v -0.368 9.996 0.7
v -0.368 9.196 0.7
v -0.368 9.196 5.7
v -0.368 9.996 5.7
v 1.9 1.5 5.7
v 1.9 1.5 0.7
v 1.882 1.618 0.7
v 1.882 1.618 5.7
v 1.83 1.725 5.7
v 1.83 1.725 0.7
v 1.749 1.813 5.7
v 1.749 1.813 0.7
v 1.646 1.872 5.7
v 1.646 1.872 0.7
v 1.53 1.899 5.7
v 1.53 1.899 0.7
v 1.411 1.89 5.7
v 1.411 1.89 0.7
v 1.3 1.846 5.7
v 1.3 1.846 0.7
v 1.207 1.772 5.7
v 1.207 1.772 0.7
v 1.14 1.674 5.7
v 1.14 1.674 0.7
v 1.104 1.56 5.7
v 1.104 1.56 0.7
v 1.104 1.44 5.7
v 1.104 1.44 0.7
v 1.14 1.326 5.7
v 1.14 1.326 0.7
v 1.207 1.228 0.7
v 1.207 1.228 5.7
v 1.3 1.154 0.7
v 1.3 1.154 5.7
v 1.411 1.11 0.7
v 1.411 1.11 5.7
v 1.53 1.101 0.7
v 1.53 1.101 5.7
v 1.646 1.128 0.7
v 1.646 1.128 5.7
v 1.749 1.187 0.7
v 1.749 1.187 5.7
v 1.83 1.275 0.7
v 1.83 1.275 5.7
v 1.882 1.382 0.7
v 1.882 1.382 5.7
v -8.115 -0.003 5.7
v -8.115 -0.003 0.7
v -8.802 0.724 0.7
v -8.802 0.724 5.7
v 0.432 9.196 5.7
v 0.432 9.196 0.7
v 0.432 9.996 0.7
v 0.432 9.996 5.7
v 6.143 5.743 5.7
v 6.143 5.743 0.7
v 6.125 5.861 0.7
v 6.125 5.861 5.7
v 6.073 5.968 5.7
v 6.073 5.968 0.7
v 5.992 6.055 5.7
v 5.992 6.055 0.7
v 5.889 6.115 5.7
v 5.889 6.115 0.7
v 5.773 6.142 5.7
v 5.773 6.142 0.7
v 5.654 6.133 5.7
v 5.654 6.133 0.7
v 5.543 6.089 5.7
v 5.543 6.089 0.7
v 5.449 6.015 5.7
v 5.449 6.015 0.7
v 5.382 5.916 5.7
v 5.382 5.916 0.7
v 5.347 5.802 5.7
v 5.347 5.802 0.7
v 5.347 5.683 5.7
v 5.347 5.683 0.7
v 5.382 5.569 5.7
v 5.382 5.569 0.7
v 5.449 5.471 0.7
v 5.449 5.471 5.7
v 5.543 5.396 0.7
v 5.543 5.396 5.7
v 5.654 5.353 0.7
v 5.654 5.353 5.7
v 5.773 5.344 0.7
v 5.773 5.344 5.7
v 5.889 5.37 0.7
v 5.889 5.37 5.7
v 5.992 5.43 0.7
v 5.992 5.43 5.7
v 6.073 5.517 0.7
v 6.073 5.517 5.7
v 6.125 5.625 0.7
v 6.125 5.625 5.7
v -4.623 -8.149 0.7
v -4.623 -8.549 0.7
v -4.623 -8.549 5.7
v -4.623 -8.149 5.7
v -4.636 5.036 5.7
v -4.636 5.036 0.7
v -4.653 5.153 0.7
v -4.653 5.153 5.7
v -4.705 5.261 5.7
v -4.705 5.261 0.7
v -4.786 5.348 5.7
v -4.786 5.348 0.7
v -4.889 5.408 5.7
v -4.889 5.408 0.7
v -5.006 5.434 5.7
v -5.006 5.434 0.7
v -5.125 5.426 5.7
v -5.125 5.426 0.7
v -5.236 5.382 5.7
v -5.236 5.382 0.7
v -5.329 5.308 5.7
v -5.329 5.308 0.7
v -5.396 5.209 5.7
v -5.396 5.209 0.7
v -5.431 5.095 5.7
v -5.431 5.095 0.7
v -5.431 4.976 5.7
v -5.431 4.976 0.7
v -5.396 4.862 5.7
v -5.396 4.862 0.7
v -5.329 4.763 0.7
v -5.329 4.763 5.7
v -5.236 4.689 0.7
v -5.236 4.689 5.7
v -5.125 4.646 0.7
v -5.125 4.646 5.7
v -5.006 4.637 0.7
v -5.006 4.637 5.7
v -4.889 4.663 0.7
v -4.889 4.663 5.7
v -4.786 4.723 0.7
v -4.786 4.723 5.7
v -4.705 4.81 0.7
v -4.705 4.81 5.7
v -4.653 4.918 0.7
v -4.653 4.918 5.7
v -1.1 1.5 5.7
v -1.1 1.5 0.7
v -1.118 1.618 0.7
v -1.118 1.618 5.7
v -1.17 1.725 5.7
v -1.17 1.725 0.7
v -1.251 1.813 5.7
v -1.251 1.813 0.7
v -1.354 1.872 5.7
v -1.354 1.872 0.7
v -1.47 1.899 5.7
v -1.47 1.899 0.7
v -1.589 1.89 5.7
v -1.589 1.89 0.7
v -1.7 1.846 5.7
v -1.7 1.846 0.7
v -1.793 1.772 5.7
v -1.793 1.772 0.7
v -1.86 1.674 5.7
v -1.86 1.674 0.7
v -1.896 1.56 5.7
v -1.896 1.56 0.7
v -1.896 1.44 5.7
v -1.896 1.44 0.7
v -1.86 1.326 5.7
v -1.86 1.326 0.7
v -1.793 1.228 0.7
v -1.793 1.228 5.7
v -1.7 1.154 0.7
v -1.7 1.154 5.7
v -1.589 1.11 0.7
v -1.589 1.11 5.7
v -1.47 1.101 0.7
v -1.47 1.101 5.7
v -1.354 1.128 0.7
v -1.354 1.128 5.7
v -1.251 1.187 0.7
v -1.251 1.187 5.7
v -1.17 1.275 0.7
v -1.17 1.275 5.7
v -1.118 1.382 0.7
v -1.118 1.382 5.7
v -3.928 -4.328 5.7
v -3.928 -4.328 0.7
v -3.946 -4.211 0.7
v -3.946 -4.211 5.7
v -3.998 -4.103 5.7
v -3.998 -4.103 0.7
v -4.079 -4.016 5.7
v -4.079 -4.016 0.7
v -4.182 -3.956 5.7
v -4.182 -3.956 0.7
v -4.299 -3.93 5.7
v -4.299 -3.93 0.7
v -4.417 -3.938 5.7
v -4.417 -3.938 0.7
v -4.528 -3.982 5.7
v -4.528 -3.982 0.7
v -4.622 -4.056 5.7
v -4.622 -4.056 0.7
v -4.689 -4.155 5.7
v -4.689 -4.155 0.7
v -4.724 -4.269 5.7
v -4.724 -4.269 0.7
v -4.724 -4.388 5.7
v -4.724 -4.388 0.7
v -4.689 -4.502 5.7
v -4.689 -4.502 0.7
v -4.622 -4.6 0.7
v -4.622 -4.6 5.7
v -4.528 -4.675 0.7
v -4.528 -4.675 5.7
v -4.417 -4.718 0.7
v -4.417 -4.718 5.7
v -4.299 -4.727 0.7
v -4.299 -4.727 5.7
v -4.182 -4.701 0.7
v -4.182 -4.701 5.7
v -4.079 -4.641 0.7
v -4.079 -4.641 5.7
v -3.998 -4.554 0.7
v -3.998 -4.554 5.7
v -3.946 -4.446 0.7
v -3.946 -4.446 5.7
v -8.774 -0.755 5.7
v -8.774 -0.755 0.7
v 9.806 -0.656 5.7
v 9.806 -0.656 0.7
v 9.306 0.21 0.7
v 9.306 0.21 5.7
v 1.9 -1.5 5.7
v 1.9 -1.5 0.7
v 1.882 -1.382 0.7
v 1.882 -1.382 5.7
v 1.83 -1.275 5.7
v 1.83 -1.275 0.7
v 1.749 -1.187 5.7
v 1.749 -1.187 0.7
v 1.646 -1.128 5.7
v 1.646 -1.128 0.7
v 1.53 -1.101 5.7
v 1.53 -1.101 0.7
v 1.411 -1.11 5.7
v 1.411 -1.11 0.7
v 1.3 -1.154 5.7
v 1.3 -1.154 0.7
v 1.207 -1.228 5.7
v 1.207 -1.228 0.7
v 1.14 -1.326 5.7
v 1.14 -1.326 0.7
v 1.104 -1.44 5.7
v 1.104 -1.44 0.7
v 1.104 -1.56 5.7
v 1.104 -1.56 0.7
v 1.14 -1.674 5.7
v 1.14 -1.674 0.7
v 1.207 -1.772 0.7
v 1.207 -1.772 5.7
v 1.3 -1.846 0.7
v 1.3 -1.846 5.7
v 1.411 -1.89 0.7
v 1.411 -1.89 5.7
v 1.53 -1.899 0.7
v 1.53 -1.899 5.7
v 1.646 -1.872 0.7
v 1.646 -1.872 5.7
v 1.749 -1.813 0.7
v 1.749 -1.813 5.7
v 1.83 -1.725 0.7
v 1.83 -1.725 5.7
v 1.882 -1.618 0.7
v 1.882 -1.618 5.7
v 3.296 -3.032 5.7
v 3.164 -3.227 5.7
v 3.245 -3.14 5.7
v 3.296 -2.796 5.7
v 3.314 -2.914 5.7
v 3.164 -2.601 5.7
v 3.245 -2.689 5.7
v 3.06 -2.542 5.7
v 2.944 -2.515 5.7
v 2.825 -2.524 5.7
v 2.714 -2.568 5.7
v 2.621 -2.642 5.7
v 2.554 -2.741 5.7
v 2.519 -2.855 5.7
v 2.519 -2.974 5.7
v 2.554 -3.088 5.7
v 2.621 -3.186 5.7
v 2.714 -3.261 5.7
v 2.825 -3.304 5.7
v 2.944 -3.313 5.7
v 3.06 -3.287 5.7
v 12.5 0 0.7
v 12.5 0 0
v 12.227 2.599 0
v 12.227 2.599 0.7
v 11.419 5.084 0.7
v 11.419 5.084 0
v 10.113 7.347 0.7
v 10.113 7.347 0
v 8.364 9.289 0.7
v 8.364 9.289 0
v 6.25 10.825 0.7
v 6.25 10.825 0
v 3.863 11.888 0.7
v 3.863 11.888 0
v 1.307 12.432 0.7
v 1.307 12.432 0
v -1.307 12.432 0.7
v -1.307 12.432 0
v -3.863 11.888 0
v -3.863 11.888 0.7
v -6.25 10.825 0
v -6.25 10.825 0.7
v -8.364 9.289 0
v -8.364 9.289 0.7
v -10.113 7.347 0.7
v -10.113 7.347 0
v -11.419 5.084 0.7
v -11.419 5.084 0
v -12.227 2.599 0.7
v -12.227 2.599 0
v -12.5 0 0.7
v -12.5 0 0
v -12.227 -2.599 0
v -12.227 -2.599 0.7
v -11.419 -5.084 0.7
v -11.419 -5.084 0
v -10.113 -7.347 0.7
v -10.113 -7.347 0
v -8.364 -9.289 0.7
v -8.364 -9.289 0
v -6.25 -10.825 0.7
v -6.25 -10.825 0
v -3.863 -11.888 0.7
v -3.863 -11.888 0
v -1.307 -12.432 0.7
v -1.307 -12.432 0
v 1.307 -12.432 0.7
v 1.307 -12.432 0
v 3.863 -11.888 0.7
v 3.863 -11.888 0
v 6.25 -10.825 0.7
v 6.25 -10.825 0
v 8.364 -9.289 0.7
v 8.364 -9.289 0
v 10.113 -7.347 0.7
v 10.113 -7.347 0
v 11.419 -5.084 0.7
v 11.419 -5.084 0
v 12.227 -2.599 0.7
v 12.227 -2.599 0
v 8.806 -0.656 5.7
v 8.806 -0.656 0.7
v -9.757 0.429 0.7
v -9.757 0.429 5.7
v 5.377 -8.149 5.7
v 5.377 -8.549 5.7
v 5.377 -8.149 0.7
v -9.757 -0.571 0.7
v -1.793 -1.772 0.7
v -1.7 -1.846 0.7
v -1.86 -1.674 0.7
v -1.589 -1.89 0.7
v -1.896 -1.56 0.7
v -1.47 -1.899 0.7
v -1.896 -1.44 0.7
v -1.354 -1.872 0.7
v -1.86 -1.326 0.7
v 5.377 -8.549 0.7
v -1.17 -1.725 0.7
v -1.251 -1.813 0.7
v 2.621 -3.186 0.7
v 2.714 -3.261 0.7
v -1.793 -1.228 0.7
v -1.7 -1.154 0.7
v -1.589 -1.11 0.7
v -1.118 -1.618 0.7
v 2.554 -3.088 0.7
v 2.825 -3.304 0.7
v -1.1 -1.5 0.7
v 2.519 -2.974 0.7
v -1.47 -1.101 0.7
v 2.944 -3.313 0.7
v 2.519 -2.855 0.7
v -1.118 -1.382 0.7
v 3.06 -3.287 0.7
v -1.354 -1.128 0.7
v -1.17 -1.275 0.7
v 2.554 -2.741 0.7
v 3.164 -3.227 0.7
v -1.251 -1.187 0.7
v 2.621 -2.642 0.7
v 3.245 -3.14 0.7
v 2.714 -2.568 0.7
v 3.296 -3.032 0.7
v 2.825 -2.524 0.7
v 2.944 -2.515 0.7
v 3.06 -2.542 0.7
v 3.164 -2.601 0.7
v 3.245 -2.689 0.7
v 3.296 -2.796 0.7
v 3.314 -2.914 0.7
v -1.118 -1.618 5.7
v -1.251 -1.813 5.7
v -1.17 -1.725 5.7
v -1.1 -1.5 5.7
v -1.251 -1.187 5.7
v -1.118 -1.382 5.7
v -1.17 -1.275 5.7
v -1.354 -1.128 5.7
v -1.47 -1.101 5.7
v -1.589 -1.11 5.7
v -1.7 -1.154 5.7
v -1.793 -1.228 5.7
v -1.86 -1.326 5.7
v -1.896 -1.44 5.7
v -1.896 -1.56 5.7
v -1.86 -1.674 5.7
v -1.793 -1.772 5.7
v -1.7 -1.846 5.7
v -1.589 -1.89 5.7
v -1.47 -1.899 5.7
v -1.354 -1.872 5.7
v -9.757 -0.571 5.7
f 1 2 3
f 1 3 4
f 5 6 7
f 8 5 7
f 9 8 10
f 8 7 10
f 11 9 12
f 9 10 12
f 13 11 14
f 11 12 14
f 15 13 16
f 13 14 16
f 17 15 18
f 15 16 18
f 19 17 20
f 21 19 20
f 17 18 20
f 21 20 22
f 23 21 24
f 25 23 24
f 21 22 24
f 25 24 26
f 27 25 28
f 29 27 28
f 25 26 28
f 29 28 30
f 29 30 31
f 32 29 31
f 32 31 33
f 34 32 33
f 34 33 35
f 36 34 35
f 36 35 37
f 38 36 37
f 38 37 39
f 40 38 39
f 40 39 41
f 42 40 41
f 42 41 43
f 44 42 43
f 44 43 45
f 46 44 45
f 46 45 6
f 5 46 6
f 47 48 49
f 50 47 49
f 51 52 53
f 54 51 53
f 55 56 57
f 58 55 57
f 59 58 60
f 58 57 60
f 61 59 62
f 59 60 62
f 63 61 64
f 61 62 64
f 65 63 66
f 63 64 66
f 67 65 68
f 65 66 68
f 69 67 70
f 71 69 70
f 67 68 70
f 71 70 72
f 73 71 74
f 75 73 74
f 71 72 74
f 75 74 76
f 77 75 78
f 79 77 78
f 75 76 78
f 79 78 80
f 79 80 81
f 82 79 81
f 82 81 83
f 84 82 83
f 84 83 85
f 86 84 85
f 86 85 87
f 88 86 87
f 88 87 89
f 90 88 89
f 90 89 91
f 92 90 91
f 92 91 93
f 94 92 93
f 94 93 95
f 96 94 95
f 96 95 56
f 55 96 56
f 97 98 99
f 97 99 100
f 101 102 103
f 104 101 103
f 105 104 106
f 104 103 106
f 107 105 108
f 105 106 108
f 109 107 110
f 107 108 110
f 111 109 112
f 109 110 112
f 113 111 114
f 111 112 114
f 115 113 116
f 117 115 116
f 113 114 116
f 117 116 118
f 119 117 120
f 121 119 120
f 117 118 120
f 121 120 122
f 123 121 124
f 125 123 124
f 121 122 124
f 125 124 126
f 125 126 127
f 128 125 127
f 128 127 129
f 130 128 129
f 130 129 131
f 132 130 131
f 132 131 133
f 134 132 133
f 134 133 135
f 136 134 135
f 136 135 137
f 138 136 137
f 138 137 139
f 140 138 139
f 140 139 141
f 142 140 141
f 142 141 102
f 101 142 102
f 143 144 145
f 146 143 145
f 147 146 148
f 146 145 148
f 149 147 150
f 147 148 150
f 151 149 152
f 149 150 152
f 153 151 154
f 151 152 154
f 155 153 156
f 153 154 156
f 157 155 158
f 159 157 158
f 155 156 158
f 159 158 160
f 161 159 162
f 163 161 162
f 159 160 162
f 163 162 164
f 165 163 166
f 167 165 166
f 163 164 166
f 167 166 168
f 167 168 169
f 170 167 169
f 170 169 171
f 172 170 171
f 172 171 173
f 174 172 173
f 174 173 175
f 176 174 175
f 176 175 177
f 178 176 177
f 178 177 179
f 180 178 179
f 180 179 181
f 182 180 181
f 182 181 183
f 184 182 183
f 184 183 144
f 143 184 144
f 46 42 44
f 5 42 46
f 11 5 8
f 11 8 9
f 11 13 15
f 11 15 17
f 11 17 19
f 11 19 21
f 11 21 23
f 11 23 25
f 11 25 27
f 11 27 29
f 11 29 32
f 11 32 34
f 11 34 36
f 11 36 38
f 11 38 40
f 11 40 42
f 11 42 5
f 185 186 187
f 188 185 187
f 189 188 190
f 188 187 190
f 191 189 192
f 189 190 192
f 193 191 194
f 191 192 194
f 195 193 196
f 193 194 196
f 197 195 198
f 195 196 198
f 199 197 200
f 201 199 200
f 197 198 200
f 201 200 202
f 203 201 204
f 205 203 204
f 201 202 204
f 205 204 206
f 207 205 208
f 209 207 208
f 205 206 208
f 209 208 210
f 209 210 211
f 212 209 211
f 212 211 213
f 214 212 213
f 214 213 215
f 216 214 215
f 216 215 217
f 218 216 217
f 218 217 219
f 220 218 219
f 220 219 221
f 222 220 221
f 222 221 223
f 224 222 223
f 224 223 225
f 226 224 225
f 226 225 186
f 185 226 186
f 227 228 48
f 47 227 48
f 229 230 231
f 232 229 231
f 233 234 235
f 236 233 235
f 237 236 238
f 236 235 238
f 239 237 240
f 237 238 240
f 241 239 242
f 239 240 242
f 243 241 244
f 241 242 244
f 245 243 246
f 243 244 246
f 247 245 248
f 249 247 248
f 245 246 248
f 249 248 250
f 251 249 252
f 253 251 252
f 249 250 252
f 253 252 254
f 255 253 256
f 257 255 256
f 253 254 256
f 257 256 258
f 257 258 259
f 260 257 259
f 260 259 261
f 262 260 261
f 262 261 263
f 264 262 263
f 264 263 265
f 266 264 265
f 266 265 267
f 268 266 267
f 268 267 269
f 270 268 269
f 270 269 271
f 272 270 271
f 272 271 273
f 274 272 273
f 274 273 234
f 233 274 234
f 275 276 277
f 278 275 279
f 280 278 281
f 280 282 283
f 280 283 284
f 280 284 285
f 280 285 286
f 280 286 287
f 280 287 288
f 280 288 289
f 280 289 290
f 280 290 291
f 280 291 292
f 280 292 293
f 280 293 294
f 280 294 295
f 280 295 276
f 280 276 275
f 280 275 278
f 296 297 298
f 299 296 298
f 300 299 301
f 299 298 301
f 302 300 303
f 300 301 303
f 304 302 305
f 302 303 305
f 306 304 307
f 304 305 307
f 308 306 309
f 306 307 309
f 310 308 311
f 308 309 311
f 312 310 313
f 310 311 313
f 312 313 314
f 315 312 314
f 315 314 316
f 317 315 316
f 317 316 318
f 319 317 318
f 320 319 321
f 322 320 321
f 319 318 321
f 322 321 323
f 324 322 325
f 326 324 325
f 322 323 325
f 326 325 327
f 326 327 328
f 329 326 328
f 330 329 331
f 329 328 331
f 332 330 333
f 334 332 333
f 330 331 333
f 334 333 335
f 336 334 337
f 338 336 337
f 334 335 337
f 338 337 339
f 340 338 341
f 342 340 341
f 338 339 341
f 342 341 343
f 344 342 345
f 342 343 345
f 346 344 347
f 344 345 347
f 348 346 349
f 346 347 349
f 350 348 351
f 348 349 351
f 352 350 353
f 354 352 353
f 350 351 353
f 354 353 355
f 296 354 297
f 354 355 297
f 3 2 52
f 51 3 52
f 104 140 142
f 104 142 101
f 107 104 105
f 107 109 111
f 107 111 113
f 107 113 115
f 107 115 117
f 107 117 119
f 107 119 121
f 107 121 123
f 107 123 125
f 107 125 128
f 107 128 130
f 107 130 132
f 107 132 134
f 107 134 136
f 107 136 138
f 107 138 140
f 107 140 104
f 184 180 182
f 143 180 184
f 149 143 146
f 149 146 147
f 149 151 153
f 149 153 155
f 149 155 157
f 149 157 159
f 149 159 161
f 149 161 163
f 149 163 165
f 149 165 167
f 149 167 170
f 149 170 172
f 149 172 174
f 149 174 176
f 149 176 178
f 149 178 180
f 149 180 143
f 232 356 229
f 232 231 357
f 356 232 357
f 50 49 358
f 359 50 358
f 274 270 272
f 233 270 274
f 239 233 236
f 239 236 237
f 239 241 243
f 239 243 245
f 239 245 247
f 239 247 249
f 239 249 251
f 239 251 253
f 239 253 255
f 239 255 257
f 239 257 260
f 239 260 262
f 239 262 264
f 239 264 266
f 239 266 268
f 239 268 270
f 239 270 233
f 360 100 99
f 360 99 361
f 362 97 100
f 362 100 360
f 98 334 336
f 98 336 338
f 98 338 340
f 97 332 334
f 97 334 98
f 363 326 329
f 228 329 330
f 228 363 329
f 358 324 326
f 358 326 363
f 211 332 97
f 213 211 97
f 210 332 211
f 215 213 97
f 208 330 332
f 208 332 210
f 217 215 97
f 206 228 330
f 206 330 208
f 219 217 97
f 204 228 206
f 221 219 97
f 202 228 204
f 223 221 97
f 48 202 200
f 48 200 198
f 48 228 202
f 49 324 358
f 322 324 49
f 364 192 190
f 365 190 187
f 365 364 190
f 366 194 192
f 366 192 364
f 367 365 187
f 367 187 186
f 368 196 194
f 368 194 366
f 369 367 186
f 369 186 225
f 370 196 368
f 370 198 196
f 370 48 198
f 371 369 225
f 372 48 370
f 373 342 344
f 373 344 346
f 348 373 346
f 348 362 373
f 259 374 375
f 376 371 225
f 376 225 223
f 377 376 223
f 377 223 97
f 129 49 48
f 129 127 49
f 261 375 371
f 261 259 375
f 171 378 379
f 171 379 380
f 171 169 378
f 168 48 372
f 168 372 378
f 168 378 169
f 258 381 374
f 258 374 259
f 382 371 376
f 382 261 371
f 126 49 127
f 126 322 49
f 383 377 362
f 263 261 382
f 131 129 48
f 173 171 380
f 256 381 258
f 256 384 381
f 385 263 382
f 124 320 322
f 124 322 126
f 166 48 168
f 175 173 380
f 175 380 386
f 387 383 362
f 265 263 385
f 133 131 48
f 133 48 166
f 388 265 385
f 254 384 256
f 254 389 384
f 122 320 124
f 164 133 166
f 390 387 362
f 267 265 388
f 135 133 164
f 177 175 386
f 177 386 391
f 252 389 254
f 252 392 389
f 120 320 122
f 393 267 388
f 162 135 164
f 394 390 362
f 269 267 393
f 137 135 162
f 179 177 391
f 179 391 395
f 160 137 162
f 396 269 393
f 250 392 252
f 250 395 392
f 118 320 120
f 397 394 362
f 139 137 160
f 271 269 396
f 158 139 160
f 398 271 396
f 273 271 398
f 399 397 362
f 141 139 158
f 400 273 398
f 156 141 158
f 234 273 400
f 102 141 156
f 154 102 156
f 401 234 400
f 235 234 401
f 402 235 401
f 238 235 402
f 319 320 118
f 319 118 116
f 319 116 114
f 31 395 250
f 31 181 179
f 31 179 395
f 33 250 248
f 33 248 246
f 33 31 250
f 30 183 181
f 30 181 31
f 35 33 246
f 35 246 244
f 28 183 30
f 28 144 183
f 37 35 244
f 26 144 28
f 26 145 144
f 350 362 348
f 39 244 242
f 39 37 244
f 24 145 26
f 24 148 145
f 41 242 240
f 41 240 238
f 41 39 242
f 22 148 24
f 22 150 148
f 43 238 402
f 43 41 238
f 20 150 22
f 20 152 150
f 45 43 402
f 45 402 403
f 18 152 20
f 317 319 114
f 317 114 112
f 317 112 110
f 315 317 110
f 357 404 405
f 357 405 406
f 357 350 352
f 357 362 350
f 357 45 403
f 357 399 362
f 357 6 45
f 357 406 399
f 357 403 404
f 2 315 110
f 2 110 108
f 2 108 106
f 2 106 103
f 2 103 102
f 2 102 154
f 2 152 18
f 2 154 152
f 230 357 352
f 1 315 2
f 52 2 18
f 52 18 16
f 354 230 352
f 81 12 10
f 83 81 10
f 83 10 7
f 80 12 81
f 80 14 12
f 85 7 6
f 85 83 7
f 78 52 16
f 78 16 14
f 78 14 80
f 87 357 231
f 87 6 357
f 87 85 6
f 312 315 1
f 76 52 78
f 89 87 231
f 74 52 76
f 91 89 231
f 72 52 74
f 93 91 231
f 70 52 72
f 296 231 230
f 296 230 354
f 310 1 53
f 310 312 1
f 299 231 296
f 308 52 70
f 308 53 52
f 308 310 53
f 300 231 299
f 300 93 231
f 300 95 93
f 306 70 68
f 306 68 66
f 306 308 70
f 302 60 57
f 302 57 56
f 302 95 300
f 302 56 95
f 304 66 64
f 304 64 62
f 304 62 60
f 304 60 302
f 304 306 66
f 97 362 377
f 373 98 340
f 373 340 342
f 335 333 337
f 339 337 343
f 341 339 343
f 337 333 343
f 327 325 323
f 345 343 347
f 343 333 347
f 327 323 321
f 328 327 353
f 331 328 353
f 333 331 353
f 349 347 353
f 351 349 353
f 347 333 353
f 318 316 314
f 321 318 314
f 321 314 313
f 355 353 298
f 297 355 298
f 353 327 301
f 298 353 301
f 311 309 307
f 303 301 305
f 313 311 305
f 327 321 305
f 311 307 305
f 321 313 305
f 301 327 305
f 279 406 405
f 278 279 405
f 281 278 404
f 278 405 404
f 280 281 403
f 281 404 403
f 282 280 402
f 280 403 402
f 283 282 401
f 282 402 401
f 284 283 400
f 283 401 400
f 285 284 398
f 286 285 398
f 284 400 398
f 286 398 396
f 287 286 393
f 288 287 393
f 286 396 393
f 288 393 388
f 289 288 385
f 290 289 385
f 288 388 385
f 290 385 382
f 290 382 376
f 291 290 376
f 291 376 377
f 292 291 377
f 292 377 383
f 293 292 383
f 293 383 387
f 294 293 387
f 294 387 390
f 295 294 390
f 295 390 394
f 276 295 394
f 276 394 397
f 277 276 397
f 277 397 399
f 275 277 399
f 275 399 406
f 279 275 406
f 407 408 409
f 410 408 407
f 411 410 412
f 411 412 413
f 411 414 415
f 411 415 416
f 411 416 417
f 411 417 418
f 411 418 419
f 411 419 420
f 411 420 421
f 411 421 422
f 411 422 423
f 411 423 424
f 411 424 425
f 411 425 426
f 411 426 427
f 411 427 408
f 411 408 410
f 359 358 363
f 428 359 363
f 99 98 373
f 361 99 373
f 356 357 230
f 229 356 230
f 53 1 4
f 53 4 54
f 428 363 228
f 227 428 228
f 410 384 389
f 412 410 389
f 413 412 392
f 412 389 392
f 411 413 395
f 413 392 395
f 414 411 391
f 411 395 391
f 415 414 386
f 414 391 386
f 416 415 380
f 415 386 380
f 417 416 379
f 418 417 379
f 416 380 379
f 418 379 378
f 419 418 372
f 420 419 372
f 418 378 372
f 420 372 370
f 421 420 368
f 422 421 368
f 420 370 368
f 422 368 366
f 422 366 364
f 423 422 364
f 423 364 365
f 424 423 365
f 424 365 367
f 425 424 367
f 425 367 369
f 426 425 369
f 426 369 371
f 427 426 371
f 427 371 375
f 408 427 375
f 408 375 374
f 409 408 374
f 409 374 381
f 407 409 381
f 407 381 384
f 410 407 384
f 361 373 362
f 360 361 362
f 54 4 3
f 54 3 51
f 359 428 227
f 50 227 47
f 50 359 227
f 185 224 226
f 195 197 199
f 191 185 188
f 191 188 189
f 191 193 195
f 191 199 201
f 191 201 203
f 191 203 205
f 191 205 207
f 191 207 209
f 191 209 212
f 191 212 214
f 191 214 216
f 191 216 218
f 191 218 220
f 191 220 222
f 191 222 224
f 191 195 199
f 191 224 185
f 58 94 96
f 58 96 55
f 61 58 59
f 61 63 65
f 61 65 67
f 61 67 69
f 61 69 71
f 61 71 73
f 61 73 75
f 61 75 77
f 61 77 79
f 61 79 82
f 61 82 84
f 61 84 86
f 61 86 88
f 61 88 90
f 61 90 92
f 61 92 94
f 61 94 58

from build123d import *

# Parameters (mm, degrees)
F0_R     = 12.5
F1_DEPTH = 0.7
F2_R     = 0.4
F2_W     = 0.8
F2_H     = 0.8
F2_W_2   = 10
F2_H_2   = 0.4
F3_DEPTH = 5.7


with BuildPart() as f1:
    # F0 (on Top) → F1 (new body)
    with BuildSketch(Plane.XY):
        Circle(F0_R)
    extrude(amount=F1_DEPTH)

    # F2 (on Top) → F3 (join)
    with BuildSketch(Plane.XY):
        with Locations((-1.5, 1.5)):
            Circle(F2_R)
        with Locations((-1.5, -1.5)):
            Circle(F2_R)
        with Locations((1.5, -1.5)):
            Circle(F2_R)
        with Locations((1.5, 1.5)):
            Circle(F2_R)
        with Locations((2.914214, -2.914214)):
            Circle(F2_R)
        with Locations((5.742641, 5.742641)):
            Circle(F2_R)
        with Locations((-5.035534, 5.035534)):
            Circle(F2_R)
        with Locations((-4.328427, -4.328427)):
            Circle(F2_R)
        with Locations((0.031655, 9.595732)):
            Rectangle(F2_W, F2_H)
        Polygon((-8.801591, 0.723574), (-9.757094, 0.428594), (-9.757094, -0.571406), (-8.774174, -0.755441), (-8.114989, -0.00346), align=None)
        Polygon((9.806349, -0.655786), (9.306349, 0.21024), (8.806349, -0.655786), align=None)
        with Locations((0.377344, -8.348521)):
            Rectangle(F2_W_2, F2_H_2)
    extrude(amount=F3_DEPTH)


solid = f1.part
